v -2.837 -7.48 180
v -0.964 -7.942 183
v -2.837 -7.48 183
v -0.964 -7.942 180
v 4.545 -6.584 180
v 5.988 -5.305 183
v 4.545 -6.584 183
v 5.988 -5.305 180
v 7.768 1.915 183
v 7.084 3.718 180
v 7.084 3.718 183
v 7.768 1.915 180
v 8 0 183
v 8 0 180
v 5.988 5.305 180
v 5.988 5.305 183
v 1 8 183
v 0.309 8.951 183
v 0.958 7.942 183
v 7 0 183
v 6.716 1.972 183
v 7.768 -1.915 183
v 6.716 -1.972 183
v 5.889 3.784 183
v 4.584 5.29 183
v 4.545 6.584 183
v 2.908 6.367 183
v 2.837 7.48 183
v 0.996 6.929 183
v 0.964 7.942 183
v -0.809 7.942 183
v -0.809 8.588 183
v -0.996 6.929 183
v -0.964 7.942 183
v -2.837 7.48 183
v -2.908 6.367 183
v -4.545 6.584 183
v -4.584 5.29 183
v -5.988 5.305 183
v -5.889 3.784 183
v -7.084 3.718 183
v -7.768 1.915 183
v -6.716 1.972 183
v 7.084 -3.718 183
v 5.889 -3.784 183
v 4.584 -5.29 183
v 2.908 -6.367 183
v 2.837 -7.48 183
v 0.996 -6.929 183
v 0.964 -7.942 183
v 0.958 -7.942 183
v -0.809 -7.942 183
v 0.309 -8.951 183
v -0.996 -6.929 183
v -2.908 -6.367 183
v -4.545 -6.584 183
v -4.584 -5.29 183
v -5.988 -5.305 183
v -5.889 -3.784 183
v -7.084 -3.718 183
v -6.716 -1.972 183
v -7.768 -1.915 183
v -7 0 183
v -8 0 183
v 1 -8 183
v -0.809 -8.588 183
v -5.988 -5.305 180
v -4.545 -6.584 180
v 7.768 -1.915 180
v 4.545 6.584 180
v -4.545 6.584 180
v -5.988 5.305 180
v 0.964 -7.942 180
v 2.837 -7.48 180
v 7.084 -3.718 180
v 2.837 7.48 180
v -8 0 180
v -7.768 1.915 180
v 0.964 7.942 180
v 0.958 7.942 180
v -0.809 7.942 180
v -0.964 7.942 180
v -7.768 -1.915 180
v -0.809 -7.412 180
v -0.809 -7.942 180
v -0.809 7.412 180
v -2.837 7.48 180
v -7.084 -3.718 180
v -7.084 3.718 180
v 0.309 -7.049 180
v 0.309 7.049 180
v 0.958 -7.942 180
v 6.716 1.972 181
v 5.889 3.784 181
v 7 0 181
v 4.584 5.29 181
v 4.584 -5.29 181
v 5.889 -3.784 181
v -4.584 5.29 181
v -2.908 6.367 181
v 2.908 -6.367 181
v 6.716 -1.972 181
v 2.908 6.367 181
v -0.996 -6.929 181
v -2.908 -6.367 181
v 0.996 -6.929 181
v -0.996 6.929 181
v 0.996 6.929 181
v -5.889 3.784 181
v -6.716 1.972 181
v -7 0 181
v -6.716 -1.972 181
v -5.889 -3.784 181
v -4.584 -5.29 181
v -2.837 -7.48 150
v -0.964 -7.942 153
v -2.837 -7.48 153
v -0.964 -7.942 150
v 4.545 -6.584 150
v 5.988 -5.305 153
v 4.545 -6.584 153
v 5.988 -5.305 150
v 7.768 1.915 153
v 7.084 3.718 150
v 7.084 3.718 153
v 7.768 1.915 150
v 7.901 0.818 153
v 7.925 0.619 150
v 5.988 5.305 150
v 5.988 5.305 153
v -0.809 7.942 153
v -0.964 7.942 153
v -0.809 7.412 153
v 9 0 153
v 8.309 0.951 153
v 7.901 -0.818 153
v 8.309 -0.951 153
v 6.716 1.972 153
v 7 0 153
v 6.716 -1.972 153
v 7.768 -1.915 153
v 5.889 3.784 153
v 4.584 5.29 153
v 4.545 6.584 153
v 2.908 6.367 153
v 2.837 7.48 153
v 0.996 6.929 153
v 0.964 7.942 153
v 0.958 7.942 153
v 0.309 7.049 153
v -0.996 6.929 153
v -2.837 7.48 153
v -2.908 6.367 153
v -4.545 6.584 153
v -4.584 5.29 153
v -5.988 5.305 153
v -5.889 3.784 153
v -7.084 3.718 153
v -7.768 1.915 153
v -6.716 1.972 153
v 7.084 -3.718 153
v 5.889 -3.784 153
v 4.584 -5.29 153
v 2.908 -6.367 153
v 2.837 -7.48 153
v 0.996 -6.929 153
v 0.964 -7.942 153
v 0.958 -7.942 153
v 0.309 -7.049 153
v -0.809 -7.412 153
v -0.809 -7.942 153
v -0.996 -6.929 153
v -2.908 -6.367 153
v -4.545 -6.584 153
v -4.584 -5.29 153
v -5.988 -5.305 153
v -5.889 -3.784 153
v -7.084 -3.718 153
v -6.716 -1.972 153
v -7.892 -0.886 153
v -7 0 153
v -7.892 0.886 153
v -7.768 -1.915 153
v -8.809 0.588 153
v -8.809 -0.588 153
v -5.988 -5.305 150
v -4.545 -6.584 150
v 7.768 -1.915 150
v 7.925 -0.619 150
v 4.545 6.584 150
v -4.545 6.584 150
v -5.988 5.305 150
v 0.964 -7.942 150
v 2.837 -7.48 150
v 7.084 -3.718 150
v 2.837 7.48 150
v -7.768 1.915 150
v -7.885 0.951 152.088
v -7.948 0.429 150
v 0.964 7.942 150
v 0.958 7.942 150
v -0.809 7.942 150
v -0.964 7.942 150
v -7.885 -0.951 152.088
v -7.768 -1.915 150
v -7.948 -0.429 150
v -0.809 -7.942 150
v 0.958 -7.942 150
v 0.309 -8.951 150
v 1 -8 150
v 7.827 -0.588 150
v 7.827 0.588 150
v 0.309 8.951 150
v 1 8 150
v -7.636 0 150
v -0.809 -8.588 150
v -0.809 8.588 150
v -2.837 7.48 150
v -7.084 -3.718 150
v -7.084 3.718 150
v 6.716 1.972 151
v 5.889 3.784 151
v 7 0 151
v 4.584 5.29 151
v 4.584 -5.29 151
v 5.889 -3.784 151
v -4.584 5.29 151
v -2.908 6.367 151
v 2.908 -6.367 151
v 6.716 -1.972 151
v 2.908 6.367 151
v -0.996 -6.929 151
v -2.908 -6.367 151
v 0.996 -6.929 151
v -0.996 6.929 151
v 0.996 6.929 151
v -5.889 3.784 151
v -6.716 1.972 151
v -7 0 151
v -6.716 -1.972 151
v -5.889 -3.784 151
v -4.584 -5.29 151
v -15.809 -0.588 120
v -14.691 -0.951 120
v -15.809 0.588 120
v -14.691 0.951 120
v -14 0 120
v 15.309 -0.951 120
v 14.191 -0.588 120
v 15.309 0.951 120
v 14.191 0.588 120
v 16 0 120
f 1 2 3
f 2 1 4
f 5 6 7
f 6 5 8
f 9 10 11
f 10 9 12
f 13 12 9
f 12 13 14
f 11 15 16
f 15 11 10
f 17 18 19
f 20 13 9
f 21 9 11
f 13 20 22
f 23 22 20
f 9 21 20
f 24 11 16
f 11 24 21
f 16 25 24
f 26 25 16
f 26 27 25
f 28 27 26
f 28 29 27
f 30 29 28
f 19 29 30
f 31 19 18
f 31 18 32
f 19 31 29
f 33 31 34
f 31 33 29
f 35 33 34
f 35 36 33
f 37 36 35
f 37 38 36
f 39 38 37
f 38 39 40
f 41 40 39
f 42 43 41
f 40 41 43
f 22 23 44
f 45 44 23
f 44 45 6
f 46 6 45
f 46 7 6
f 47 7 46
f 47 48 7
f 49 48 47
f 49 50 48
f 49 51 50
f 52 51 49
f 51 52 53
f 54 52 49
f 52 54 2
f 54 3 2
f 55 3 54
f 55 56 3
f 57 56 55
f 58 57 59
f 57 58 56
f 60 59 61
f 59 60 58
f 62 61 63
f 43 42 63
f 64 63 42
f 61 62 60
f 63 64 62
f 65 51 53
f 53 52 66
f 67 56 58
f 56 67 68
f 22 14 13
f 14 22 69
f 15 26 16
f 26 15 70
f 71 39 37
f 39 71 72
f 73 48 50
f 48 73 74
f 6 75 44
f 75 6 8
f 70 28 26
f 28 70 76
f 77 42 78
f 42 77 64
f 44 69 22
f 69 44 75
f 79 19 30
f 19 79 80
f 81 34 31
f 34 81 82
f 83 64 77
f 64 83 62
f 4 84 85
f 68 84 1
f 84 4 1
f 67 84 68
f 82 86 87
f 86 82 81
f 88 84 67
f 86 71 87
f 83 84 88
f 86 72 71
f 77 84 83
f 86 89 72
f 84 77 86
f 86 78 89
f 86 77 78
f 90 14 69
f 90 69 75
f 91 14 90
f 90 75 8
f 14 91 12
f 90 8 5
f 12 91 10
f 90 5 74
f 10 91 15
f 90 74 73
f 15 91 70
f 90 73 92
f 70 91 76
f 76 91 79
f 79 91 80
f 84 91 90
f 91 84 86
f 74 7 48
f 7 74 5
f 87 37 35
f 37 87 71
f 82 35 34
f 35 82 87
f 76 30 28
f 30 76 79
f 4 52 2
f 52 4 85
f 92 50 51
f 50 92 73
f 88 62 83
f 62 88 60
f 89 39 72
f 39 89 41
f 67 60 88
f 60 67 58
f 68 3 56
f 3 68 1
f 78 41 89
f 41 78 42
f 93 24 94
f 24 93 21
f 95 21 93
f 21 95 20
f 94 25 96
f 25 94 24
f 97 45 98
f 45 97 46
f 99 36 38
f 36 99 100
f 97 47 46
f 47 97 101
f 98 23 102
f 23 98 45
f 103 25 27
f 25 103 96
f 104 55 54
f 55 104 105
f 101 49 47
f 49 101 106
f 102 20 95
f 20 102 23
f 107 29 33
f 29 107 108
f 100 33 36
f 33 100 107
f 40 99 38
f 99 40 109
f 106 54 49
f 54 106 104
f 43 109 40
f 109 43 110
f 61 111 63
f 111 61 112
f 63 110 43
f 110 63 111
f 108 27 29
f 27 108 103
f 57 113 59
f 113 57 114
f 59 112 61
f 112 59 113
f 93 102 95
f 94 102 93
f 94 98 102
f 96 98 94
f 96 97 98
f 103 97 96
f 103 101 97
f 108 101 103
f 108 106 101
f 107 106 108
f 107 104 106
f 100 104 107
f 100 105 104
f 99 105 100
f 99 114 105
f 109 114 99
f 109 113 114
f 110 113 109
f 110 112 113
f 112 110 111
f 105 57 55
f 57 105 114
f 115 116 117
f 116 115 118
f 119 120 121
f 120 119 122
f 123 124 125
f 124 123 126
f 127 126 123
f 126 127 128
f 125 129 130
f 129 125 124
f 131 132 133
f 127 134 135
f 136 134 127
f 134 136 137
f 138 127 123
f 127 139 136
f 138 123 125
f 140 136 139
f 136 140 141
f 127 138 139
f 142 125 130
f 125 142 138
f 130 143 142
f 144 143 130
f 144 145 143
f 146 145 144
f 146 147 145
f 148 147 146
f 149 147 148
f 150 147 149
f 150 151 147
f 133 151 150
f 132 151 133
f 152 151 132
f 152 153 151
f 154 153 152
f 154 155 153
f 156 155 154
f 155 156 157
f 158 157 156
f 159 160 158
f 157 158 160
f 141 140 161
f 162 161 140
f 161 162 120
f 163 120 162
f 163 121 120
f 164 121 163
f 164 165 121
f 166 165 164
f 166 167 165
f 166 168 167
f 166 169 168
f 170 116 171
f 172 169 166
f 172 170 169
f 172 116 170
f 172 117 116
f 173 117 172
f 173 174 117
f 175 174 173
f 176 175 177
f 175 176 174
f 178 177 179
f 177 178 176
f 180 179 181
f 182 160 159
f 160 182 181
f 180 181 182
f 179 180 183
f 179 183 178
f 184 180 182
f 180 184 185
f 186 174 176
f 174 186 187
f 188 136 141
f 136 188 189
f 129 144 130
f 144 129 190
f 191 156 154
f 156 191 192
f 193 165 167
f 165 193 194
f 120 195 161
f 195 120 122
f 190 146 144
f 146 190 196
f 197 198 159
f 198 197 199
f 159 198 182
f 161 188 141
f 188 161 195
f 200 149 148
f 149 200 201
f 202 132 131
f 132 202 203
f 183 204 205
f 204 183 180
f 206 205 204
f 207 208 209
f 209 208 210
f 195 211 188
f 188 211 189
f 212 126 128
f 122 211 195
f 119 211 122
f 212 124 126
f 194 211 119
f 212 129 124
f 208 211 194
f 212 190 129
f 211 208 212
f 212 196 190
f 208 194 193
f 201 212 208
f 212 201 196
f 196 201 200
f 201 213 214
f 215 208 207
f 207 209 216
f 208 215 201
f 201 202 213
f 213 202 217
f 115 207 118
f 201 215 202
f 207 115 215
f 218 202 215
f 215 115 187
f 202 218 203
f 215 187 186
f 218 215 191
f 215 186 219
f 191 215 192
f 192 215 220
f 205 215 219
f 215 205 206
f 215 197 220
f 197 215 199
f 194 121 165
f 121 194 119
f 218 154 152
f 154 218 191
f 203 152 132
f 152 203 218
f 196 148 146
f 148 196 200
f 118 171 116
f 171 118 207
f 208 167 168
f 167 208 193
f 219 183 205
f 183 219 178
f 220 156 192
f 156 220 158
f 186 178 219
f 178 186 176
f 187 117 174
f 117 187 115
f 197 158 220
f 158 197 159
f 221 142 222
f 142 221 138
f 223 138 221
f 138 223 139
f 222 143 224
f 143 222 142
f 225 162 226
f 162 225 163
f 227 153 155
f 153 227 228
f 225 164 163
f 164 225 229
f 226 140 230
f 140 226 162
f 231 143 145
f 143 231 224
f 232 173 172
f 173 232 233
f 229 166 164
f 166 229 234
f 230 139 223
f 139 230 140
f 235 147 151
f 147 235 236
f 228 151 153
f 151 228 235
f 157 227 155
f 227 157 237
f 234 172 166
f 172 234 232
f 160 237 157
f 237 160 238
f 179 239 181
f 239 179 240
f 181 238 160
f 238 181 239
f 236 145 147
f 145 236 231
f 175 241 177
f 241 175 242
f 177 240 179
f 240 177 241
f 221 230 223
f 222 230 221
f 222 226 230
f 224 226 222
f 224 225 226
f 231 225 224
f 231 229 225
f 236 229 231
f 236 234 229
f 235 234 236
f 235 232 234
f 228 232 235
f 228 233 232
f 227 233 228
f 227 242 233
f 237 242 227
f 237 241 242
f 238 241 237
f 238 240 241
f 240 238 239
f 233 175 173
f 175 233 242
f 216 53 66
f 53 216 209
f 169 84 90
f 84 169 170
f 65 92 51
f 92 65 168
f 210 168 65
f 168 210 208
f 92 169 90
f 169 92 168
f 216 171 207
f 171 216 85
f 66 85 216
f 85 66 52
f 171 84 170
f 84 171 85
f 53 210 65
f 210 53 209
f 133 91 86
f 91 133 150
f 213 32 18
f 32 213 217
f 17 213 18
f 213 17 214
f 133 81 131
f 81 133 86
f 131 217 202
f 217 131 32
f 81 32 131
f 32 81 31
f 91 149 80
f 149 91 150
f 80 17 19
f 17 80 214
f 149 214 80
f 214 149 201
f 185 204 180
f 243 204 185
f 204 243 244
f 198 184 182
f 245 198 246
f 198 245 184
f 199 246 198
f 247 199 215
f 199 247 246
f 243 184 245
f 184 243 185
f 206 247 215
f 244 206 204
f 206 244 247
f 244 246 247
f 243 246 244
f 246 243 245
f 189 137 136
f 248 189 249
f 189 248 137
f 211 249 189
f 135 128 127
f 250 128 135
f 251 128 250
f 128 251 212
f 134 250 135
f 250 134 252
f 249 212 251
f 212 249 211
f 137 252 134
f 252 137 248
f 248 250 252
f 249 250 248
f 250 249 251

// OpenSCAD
module holder(r_ext, r_int, thickness, height) {
  difference() {
    cylinder(thickness + height, r_ext, r_ext);
    translate([0, 0, thickness])
      cylinder(height, r_int, r_int);
  }
}

base_top_z = 120;
base_top_r = 15;
holder1_z = 150;
holder2_z = 180;

translate([0, 0, holder2_z]) holder(8, 7, 1, 2);
translate([0, 0, holder1_z]) holder(8, 7, 1, 2);
translate([0, 0, holder1_z]) {
  translate([0, -8, 0]) cylinder(holder2_z - holder1_z + 3, 1, 1);
  translate([0, +8, 0]) cylinder(holder2_z - holder1_z + 3, 1, 1);
}
translate([0, 0, base_top_z]) {
  h = holder1_z - base_top_z + 3;
  skew_rate = (8 - base_top_r) / h;
  I = [
    [1, 0, 0, 0],
    [0, 1, 0, 0],
    [0, 0, 1, 0],
    [0, 0, 0, 1],
  ];
  skew_m = [
    [0, 0, skew_rate, 0],
    [0, 0, 0, 0],
    [0, 0, 0, 0],
    [0, 0, 0, 0],
  ];
  translate([-base_top_r, 0, 0]) multmatrix(I - skew_m) cylinder(h, 1, 1);
  translate([+base_top_r, 0, 0]) multmatrix(I + skew_m) cylinder(h, 1, 1);
}
